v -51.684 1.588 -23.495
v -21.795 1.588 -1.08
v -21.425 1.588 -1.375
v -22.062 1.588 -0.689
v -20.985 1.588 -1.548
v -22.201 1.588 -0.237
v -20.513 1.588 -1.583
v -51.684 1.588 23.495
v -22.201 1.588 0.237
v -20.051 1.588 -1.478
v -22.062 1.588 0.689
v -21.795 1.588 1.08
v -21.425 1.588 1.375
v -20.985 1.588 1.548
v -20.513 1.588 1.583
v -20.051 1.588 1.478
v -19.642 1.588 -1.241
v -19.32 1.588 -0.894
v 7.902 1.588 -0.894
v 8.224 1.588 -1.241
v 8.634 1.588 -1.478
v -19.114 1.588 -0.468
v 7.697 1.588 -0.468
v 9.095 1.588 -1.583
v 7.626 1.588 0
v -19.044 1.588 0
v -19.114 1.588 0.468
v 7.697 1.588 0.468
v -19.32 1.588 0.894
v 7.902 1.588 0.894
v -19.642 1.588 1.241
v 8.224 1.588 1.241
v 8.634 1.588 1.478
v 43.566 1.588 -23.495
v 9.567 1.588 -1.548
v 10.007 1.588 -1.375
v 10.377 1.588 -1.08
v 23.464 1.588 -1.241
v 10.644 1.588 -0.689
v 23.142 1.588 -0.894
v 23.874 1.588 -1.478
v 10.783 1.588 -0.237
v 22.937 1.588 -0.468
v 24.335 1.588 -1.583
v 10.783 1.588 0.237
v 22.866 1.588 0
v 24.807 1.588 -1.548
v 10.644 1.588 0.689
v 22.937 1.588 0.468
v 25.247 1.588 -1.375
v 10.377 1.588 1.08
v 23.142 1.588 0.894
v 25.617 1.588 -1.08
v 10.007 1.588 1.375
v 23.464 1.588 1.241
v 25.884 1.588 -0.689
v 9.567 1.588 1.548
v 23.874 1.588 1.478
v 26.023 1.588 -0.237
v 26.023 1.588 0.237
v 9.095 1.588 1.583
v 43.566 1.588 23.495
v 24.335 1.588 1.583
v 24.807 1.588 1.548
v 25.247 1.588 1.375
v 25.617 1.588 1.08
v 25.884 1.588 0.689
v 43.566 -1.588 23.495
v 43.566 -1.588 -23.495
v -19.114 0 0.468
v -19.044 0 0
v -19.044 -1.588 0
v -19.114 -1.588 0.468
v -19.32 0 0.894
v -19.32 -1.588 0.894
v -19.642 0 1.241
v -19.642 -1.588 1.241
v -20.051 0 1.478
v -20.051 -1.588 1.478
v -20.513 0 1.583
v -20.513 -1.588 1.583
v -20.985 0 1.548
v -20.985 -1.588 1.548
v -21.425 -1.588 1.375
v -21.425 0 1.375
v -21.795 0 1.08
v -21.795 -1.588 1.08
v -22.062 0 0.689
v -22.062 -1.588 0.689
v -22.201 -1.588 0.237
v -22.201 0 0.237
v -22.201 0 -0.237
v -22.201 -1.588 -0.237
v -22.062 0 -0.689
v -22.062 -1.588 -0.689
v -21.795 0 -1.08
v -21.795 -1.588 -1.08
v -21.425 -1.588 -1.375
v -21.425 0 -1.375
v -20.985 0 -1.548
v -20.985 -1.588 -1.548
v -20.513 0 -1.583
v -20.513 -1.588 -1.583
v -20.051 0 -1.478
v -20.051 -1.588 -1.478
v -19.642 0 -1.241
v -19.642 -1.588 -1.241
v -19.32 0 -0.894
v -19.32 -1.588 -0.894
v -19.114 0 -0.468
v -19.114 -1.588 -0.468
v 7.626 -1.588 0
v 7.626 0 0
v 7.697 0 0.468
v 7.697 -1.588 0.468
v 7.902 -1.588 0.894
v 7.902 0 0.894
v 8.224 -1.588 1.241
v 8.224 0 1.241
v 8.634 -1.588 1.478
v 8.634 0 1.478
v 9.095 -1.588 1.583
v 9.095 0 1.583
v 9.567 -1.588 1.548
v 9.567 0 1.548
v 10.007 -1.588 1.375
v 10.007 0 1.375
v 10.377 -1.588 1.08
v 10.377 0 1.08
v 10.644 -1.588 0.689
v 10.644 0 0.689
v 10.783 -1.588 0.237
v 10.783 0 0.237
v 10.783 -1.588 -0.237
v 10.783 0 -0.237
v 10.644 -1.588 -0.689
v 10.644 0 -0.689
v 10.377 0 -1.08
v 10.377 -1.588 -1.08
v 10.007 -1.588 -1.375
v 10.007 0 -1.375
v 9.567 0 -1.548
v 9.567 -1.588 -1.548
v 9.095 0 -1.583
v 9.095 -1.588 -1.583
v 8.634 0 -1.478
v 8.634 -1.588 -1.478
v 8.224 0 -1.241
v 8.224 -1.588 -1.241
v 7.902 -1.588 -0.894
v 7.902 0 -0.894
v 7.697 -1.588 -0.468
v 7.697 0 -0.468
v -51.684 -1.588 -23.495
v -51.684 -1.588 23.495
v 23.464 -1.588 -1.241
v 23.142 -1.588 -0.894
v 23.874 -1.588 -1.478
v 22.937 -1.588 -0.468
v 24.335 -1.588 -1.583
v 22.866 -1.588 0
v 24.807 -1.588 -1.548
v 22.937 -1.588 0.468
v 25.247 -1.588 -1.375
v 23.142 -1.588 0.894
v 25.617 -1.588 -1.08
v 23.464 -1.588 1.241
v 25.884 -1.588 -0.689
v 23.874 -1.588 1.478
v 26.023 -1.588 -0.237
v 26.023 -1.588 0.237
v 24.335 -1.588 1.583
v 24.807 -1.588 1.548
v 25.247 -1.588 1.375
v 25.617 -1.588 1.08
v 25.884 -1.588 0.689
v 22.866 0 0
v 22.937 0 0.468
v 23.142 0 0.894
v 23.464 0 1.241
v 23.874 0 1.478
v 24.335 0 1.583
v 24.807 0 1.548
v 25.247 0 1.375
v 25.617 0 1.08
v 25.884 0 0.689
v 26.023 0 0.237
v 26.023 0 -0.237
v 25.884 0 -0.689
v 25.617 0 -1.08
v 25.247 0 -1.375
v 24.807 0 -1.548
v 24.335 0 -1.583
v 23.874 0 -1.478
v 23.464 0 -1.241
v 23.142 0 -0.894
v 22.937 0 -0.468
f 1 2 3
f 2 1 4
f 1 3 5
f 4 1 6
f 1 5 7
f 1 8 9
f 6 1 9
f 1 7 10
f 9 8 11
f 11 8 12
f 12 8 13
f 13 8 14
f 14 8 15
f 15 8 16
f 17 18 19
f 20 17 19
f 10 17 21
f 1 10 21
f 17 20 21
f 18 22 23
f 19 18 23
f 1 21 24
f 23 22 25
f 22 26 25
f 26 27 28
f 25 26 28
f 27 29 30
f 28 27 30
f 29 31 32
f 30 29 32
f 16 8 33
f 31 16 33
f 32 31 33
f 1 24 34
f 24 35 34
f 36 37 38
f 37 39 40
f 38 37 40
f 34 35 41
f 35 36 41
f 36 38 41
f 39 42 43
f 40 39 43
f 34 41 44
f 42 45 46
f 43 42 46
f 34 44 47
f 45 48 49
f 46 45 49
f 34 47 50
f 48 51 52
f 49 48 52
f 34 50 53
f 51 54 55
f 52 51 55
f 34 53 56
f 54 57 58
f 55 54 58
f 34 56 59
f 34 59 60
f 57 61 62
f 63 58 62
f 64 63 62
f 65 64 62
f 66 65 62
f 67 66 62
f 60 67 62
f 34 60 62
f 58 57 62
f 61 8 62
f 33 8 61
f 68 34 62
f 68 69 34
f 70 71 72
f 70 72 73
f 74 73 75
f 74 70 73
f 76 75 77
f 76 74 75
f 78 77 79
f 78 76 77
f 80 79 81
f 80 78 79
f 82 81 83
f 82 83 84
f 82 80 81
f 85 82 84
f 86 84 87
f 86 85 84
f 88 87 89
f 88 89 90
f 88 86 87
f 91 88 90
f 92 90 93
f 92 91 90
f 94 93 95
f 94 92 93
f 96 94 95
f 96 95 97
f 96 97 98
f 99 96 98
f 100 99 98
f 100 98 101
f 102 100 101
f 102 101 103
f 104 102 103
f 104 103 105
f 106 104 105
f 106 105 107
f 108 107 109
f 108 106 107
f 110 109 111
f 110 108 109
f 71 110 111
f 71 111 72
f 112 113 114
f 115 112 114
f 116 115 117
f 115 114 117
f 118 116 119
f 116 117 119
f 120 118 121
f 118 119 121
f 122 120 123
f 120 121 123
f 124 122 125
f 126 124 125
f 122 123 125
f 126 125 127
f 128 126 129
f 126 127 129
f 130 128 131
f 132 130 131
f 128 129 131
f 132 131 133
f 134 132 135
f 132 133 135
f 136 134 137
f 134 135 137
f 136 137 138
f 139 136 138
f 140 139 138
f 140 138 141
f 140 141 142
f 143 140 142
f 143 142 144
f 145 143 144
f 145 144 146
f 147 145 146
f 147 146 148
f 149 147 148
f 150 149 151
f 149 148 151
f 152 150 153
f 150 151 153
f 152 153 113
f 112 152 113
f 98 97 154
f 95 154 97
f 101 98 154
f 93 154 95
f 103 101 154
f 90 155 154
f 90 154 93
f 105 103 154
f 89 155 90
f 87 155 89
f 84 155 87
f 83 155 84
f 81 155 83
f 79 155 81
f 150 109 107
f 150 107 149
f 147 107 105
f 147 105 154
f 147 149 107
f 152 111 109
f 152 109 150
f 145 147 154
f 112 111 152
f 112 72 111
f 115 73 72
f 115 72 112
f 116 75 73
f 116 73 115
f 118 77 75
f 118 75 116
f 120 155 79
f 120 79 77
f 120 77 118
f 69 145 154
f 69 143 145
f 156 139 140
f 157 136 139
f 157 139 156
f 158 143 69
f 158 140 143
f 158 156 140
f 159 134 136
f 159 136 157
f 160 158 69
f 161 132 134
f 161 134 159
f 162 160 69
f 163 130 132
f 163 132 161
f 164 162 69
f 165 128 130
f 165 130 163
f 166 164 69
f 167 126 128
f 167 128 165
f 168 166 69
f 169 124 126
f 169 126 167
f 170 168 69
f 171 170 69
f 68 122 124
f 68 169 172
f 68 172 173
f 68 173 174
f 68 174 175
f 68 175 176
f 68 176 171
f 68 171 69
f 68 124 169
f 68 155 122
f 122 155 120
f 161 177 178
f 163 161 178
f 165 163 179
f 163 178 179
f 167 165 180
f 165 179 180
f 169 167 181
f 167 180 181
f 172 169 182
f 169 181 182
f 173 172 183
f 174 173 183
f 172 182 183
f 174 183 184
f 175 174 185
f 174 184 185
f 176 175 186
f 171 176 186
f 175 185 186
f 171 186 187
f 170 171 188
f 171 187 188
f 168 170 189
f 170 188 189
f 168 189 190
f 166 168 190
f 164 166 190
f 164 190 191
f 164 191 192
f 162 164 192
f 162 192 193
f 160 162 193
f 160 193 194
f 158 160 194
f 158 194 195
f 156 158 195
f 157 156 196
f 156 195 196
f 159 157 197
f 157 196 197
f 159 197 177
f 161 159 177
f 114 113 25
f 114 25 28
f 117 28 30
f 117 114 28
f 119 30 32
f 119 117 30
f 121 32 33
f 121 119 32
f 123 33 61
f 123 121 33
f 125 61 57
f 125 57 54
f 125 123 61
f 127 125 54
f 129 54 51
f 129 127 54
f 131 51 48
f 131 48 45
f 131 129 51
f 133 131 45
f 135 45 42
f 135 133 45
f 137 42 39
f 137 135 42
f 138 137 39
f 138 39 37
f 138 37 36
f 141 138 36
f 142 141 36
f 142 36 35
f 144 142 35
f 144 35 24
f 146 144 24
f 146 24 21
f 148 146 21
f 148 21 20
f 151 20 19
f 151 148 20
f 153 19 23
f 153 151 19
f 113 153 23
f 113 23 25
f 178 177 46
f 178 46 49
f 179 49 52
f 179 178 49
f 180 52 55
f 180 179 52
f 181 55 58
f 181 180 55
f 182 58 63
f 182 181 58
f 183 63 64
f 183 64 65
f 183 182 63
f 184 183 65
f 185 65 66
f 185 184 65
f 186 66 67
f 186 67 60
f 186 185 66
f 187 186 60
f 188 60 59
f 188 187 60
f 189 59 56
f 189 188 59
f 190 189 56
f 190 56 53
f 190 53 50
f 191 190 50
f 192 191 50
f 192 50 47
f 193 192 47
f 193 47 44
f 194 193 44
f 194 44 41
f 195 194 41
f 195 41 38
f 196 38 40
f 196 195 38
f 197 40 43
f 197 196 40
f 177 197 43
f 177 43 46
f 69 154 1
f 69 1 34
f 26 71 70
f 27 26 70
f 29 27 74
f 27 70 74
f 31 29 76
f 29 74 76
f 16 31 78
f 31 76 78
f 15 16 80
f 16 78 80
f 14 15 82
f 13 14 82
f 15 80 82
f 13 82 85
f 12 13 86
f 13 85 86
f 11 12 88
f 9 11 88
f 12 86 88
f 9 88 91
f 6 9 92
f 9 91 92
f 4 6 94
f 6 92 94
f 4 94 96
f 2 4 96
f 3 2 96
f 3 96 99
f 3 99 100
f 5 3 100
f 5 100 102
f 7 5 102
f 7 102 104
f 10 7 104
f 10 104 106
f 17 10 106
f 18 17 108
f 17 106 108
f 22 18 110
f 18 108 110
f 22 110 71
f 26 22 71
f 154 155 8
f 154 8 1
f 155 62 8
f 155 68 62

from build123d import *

# Parameters (mm, degrees)
F0_R     = 1.5875
F1_DEPTH = 1.5875


with BuildPart() as f1:
    # F0 (on Front) → F1 (new body, symmetric)
    with BuildSketch(Plane.XZ):
        Polygon((43.5661792159, 23.495), (-38.9838207841, 23.495), (-51.6838207841, 23.495), (-51.6838207841, -23.495), (-38.9838207841, -23.495), (43.5661792159, -23.495), align=None)
        with Locations((-20.6313711017, 0)):
            Circle(F0_R, mode=Mode.SUBTRACT)
        with BuildLine():
            ThreePointArc((10.8011288983, 0), (9.2136288983, -1.5875), (7.6261288983, 0))
            ThreePointArc((7.6261288983, 0), (9.2136288983, 1.5875), (10.8011288983, 0))
        make_face(mode=Mode.SUBTRACT)
        with BuildLine():
            ThreePointArc((26.0411288983, 0), (24.4536288983, -1.5875), (22.8661288983, 0))
            ThreePointArc((22.8661288983, 0), (24.4536288983, 1.5875), (26.0411288983, 0))
        make_face(mode=Mode.SUBTRACT)
    extrude(amount=F1_DEPTH, both=True)


solid = f1.part
